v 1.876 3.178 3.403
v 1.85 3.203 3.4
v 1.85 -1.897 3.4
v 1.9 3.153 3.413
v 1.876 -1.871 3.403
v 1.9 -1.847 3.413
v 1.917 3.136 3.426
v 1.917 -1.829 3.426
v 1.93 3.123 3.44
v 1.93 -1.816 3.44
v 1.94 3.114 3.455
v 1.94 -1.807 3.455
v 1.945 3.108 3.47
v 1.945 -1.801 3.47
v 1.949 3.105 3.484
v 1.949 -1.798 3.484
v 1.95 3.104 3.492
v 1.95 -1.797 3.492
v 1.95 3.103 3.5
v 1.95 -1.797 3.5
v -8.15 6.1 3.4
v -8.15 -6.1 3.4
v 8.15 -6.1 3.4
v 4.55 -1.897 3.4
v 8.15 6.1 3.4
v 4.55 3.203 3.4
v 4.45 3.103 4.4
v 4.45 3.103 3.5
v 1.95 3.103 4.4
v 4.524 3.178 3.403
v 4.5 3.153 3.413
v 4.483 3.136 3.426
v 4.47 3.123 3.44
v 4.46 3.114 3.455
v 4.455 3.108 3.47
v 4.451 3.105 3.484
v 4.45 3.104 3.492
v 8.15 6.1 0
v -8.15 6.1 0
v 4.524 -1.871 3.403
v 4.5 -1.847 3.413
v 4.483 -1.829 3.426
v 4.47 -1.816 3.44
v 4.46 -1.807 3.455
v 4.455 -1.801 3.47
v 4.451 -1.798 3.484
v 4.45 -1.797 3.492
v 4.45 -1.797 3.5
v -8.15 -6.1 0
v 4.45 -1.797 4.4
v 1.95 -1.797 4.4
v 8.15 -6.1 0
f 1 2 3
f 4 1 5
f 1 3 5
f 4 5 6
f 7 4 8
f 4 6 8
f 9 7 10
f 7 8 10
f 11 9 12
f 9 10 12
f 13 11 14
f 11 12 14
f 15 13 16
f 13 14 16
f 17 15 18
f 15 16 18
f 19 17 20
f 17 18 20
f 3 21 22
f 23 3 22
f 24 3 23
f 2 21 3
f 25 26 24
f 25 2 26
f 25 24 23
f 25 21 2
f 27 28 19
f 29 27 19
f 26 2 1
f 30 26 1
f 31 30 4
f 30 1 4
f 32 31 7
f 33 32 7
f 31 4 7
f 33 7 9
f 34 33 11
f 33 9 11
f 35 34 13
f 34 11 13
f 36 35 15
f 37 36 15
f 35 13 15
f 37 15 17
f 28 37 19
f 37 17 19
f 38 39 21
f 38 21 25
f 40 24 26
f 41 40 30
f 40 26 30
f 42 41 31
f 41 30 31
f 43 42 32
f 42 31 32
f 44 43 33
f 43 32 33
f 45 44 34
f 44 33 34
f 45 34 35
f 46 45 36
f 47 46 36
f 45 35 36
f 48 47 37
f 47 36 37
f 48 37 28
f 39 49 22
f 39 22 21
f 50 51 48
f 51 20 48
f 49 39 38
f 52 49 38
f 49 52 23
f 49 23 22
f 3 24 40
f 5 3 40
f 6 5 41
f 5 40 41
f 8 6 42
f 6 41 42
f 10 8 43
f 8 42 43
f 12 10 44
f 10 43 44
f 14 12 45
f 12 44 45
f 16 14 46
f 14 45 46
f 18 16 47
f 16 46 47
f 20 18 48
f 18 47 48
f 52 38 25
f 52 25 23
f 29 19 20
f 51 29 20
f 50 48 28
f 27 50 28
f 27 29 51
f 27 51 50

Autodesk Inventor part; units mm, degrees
ref_plane "YZ Plane" through (0, 0, 0) normal (1, 0, 0) x (0, 1, 0)
ref_plane "XZ Plane" through (0, 0, 0) normal (0, 1, 0) x (-1, 0, 0)
ref_plane "XY Plane" through (0, 0, 0) normal (0, 0, 1) x (1, 0, 0)
sketch "草图1" plane through (0, 0, 0) normal (0, 0, 1) x (1, 0, 0)
  line L0 (8.15, -6.1) -> (-8.15, -6.1)
  line L1 (-8.15, -6.1) -> (-8.15, 6.1)
  line L2 (-8.15, 6.1) -> (8.15, 6.1)
  line L3 (8.15, 6.1) -> (8.15, -6.1)
  line L4 (8.15, -6.1) -> (-8.15, 6.1) construction
  line L5 (-8.15, -6.1) -> (8.15, 6.1) construction
  point P0 (0, 0)
  dimension "d0" = 16.3
  dimension "d1" = 12.2
extrude "拉伸1" add sketch "草图1" along normal blind 3.4
sketch "草图2" plane through (0, 0, 3.4) normal (0, 0, 1) x (1, 0, 0)
  line L0 (4.45, 0) -> (4.45, 4.1654) construction
  line L1 (8.15, 6.1) -> (8.15, -6.1) construction
  line L2 (4.45, 3.1034) -> (1.95, 3.1034)
  line L3 (1.95, 3.1034) -> (1.95, -1.7966)
  line L4 (1.95, -1.7966) -> (4.45, -1.7966)
  line L5 (4.45, -1.7966) -> (4.45, 3.1034)
  point P0 (0, 0)
  dimension "d4" = 3.7
  dimension "d5" = 4.9
  dimension "d6" = 2.5
extrude "拉伸2" add sketch "草图2" along normal blind 1
fillet "圆角1" radius 0.1 4 edges at (4.45, 0.6534, 3.4) (3.2, 3.1034, 3.4) (3.2, -1.7966, 3.4) (1.95, 0.6534, 3.4)
properties part number "激光传感器模型" material "氮化硅"
